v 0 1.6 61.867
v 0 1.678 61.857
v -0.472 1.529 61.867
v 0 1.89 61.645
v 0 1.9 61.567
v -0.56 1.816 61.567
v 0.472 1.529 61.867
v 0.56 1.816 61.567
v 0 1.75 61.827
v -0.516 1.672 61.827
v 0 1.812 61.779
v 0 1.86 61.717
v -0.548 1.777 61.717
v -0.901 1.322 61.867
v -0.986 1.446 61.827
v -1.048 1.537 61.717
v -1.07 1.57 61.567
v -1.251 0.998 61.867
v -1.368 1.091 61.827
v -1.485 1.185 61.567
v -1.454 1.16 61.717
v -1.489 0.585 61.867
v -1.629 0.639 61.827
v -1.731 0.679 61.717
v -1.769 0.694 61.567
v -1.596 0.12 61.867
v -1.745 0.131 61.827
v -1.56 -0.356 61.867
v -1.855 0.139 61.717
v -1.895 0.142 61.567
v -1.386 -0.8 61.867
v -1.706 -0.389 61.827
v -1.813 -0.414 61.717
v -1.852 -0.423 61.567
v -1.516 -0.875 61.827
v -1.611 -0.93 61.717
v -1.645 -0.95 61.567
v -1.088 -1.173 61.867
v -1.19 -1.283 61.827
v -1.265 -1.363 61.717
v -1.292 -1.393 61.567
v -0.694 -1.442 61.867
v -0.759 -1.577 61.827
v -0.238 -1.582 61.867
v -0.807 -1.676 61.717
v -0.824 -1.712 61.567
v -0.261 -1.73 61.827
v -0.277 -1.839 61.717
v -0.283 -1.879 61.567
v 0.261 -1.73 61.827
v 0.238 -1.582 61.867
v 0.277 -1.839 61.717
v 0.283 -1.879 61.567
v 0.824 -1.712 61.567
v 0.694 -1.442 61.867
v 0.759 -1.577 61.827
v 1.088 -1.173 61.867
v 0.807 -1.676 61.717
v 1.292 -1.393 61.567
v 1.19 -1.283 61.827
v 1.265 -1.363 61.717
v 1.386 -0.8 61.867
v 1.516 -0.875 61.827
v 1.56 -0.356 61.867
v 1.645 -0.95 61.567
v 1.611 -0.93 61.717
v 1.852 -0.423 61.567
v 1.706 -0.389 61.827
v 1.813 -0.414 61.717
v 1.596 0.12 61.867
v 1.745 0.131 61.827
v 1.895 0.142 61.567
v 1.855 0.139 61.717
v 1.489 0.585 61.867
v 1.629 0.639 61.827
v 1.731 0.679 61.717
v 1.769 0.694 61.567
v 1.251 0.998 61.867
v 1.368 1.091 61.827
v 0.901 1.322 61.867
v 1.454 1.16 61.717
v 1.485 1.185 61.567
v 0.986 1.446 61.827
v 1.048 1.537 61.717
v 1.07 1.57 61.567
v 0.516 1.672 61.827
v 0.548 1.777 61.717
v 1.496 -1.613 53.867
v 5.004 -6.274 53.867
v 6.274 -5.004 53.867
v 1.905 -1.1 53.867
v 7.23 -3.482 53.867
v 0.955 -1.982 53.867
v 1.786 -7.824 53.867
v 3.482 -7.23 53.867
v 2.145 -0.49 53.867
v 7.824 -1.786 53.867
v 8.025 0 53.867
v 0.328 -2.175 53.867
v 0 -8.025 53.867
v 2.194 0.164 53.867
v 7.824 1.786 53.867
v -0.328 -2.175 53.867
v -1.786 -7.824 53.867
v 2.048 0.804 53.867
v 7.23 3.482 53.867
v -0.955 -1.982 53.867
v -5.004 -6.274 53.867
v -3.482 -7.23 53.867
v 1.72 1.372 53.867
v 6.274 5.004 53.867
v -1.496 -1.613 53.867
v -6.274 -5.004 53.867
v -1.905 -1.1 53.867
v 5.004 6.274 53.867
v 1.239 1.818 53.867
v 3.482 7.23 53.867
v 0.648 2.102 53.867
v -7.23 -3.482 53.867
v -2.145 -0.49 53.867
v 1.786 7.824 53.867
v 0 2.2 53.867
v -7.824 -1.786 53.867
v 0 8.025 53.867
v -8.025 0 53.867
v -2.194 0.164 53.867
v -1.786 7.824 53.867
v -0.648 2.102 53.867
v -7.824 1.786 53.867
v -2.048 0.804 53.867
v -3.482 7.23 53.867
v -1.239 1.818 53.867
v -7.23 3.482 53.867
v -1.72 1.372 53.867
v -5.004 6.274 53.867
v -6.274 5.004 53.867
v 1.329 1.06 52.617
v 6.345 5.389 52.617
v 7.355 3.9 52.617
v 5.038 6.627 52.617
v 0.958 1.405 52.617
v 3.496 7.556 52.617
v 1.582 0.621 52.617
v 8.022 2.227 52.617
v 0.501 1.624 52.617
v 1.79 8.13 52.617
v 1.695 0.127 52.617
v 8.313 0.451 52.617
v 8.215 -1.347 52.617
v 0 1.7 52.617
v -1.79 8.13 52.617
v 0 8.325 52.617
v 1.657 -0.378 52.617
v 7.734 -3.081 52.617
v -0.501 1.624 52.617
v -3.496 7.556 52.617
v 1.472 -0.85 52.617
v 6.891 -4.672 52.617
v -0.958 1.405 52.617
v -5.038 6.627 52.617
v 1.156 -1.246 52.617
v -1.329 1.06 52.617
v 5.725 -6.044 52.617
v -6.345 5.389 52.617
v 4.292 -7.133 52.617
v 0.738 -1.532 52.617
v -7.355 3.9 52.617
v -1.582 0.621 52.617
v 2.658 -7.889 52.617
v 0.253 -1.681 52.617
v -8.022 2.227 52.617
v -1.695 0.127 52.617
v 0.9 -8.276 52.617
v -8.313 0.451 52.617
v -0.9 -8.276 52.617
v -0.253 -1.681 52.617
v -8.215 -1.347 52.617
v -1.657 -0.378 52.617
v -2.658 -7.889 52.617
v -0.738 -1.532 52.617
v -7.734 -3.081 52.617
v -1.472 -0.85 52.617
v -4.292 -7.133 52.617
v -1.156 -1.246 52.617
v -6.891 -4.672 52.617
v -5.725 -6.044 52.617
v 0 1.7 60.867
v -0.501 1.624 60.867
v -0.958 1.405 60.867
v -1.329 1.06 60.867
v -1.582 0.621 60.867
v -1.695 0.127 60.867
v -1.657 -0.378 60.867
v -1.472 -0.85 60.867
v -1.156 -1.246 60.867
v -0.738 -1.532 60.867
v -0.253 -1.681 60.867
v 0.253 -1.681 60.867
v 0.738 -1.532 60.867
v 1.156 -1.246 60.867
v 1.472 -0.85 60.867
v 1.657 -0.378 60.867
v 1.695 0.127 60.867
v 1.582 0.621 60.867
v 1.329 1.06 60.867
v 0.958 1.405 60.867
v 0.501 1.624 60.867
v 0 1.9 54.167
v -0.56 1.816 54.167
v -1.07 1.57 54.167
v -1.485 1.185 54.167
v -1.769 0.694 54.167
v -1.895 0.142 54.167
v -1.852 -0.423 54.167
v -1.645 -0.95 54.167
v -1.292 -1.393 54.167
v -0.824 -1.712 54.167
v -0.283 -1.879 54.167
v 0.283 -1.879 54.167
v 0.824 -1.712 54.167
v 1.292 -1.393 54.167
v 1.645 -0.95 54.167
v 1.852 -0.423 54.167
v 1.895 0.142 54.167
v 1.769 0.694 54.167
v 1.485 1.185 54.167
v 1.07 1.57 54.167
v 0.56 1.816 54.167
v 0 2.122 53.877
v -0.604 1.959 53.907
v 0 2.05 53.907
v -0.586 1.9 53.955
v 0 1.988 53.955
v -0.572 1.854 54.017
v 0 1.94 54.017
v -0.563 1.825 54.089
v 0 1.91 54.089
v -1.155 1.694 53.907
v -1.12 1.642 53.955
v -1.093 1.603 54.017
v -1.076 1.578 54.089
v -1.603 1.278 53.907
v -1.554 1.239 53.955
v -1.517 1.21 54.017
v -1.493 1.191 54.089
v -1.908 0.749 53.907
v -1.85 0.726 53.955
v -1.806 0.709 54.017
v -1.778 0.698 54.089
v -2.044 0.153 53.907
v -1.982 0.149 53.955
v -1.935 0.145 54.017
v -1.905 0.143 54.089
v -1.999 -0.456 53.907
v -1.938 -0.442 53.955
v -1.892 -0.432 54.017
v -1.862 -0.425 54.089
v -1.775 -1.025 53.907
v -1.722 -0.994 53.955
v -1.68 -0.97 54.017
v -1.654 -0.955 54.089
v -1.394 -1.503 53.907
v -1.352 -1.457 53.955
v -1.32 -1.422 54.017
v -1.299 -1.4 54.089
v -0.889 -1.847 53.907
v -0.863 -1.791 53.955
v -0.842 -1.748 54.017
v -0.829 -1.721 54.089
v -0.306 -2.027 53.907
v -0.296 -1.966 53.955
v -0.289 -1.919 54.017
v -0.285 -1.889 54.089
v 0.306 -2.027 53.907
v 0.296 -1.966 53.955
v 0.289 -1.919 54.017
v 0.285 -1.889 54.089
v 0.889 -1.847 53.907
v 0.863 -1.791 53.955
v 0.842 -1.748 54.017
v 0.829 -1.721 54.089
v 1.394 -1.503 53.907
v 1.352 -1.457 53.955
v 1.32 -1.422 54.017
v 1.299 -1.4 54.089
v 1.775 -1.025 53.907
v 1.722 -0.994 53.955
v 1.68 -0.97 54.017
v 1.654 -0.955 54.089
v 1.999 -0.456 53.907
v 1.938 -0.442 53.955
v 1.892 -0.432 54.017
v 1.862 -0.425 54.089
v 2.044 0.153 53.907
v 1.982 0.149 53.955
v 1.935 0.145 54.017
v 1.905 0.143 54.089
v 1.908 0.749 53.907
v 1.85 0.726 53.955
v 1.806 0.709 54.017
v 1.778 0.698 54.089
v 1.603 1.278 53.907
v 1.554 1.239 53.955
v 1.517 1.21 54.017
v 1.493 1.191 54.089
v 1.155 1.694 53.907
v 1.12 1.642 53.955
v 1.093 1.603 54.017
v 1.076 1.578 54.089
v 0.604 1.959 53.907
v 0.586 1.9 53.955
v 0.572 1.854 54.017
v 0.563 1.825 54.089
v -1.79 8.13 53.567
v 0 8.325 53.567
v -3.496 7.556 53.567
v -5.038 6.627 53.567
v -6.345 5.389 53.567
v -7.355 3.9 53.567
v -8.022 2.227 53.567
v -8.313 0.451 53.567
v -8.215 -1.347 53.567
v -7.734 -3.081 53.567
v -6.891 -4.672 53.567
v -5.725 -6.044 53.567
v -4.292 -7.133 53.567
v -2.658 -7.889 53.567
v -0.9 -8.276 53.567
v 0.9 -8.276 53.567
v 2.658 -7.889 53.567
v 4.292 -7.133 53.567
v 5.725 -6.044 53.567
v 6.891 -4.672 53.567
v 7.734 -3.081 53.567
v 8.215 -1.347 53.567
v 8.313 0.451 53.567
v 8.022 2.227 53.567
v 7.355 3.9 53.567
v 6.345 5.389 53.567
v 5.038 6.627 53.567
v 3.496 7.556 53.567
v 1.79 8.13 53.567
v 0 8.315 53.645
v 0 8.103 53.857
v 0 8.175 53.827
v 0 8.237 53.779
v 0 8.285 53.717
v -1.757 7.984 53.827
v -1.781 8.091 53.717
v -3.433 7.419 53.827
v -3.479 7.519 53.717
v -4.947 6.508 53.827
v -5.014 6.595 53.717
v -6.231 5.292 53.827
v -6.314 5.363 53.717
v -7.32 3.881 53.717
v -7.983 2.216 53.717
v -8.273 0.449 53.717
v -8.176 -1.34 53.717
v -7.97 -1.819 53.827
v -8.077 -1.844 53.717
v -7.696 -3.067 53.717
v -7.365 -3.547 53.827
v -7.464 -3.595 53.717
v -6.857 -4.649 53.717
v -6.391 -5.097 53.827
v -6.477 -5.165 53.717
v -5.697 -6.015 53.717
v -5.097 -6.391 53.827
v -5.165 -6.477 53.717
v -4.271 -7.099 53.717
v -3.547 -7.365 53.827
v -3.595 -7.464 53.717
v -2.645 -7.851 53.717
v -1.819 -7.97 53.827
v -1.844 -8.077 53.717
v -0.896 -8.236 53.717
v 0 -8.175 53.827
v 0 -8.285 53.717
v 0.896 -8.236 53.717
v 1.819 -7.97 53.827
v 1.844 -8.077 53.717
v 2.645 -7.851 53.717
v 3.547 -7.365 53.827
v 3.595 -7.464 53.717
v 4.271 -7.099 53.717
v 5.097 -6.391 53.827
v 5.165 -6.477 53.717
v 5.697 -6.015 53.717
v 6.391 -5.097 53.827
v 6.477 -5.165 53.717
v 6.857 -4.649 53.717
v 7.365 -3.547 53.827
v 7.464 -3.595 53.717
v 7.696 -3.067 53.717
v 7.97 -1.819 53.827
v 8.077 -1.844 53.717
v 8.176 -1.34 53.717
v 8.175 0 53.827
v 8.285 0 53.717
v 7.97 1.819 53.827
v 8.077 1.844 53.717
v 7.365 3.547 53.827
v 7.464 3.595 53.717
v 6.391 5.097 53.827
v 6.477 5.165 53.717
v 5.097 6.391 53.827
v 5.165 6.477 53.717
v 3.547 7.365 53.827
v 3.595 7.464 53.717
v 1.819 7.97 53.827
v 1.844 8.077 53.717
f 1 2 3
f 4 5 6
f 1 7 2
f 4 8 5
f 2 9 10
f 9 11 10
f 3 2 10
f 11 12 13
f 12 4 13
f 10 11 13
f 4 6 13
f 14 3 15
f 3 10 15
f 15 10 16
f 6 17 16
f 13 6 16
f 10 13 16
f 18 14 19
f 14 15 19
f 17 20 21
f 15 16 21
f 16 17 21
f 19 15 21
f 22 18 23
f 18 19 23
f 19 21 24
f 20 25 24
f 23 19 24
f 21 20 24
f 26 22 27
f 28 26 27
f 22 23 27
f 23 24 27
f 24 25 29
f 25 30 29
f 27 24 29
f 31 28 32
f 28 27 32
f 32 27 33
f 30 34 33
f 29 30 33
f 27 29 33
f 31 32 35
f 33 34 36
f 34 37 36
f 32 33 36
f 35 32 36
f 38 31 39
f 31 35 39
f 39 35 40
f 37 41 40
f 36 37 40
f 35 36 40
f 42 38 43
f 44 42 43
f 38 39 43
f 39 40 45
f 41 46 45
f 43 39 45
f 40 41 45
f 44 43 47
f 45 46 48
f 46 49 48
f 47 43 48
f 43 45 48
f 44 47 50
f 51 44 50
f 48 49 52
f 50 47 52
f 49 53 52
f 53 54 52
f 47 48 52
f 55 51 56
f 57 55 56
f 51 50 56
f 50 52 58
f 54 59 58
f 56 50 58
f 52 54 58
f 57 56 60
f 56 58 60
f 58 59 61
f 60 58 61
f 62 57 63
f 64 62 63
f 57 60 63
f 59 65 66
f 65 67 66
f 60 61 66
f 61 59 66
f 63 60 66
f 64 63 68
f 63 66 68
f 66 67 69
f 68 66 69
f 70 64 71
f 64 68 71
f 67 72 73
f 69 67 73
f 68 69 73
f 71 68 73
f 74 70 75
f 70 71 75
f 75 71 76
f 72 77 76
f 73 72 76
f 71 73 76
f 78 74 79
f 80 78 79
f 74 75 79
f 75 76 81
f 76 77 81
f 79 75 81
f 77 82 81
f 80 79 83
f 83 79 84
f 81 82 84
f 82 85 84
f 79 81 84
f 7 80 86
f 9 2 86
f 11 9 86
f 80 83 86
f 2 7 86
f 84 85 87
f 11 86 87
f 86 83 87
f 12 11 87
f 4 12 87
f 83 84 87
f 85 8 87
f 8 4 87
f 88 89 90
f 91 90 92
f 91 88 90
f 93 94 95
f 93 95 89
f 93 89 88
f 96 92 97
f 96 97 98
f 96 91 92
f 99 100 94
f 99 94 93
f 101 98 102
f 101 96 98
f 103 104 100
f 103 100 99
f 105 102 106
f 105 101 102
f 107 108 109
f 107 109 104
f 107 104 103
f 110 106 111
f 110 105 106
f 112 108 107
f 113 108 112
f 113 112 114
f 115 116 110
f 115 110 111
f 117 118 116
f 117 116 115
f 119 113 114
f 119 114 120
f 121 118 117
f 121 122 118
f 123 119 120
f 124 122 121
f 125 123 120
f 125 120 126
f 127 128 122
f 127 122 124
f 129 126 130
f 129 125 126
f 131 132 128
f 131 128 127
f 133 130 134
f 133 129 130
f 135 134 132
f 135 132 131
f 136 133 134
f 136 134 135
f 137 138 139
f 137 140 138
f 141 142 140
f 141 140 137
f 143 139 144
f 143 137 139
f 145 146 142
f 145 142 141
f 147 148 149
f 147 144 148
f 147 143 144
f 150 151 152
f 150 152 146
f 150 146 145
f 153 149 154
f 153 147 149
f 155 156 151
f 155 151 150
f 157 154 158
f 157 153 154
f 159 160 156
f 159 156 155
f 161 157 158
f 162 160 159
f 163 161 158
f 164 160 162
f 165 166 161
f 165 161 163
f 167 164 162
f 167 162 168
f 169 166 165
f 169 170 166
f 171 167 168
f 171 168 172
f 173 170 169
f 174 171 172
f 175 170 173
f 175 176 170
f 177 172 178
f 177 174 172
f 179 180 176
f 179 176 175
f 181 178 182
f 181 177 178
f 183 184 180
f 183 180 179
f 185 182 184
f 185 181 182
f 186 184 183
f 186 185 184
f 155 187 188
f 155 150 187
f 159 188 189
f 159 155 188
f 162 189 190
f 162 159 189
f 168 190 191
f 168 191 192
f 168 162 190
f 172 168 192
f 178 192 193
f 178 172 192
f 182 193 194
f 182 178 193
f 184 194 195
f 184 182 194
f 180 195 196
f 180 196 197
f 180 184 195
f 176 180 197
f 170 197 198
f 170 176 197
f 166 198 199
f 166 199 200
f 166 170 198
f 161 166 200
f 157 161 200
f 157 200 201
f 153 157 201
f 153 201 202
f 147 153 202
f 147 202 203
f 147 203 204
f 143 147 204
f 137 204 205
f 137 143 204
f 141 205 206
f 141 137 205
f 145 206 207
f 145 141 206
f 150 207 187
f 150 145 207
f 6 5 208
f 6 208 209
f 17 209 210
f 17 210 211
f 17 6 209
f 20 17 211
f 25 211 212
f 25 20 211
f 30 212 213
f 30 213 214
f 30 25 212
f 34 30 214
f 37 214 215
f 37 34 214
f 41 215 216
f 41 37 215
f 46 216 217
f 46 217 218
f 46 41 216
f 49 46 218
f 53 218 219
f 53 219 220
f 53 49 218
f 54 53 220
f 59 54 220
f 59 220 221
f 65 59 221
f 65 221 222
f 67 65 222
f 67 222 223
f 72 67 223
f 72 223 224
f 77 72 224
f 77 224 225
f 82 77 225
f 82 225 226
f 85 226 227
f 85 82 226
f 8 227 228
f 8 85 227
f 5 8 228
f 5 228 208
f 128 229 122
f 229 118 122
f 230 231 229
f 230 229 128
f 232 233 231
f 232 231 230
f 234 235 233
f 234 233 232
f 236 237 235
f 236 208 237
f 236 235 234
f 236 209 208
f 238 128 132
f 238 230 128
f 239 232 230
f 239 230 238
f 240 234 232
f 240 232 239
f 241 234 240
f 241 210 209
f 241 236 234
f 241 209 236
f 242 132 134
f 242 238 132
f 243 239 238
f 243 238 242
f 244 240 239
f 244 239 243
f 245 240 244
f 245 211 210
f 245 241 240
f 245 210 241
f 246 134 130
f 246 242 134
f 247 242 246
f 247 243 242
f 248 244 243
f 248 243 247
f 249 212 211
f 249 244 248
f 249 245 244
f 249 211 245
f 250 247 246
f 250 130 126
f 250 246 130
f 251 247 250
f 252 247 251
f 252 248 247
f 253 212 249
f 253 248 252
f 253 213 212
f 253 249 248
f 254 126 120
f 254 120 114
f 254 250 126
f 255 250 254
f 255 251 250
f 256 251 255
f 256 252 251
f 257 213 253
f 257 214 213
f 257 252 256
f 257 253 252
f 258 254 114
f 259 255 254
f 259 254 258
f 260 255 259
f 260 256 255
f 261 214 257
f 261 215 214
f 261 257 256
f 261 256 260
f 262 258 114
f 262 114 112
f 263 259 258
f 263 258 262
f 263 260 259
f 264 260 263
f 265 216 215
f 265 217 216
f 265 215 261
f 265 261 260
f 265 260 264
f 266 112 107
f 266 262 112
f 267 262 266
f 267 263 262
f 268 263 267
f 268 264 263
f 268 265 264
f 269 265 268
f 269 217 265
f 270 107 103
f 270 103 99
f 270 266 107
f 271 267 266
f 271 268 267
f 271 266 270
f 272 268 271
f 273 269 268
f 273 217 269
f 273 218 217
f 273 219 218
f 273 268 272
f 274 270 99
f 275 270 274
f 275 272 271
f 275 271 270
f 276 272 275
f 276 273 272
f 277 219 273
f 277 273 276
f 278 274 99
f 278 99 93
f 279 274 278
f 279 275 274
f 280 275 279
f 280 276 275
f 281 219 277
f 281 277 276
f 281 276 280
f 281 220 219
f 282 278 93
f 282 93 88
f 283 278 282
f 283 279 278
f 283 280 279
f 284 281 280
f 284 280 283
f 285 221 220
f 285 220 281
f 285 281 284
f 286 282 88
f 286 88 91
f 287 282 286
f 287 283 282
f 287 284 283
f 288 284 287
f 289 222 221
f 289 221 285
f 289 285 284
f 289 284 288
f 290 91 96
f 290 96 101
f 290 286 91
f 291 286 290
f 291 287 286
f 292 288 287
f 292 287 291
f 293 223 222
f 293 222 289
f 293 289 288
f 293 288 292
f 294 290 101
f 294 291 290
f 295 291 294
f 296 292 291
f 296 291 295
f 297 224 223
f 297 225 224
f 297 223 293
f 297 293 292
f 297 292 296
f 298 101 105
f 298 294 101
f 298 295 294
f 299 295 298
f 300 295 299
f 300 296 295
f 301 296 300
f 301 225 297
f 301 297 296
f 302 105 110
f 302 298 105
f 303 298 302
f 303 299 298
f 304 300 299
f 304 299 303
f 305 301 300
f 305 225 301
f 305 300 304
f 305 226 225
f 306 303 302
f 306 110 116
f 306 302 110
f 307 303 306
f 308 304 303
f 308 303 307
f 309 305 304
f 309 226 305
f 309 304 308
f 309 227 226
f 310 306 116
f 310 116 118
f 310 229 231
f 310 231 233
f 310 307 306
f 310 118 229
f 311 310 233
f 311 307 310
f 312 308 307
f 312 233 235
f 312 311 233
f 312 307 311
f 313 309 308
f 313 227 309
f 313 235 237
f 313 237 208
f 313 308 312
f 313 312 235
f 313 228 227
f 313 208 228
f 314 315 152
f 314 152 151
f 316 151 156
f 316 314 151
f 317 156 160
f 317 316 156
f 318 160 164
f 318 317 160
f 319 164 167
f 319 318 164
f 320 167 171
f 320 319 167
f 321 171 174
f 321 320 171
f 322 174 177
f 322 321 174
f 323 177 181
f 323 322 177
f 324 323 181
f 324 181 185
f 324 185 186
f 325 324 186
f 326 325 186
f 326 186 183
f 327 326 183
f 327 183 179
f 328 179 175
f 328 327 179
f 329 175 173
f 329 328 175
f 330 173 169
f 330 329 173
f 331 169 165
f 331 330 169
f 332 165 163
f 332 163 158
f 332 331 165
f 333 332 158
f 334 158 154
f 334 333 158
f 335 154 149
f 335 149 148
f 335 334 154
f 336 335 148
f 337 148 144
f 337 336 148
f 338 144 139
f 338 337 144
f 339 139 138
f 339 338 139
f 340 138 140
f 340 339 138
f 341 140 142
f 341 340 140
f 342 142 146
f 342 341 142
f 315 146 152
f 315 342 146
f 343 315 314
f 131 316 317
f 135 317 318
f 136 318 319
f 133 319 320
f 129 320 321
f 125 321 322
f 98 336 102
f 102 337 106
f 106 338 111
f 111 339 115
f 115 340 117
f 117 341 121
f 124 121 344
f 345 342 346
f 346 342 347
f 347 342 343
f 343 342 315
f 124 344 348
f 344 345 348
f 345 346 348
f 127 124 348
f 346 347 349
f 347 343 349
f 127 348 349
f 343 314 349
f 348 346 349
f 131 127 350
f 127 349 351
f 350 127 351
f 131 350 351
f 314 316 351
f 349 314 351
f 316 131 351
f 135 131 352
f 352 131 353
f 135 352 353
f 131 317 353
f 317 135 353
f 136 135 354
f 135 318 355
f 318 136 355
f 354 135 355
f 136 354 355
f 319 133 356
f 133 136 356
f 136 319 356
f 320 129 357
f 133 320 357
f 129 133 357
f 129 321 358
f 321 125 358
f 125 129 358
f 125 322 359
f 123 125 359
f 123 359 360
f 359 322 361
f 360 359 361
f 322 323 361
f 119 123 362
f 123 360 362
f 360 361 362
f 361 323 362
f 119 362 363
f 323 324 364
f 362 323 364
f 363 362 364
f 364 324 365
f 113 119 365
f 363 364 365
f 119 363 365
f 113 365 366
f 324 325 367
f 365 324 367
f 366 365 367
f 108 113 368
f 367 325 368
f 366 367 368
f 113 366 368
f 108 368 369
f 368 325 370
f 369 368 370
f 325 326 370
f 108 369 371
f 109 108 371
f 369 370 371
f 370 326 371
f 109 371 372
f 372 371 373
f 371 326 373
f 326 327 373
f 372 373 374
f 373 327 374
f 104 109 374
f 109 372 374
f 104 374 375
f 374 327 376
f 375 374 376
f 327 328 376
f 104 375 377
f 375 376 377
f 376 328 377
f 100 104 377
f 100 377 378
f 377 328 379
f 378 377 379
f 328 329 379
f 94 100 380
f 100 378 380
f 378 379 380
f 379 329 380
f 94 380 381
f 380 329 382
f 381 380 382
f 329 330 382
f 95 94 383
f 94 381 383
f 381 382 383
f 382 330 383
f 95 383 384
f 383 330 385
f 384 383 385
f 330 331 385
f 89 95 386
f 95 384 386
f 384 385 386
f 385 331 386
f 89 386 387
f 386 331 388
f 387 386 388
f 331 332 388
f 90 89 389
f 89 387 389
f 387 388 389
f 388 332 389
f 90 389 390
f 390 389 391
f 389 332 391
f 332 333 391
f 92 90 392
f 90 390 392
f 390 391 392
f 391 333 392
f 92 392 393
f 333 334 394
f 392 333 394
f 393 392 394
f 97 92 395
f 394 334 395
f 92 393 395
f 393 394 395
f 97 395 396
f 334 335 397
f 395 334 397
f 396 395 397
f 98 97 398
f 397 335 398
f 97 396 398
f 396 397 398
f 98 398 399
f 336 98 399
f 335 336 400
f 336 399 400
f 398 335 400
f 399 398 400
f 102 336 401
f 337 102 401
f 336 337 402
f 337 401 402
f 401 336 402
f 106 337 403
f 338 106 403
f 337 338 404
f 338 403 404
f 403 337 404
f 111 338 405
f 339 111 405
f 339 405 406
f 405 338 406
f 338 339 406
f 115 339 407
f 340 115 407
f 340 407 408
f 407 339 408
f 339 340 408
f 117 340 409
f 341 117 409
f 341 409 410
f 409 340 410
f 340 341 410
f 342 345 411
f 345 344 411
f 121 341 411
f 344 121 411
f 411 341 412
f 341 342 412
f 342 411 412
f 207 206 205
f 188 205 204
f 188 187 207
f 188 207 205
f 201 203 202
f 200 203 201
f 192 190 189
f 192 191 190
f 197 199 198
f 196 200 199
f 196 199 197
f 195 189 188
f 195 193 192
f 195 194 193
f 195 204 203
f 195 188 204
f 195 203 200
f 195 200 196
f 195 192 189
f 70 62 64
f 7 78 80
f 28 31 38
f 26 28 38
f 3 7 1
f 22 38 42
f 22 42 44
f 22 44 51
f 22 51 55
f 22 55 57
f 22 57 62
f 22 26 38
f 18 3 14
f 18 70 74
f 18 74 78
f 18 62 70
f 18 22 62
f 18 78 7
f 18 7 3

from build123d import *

# Parameters (mm, degrees)
F2_R = 0.3
F3_R = 0.3
F4_R = 0.3


with BuildPart() as f1:
    # F0 (on Right) → F1 (revolve)
    with BuildSketch(Plane.YZ):
        Polygon((1.9, 61.867032), (0, 61.867032), (0, 60.867032), (1.7, 60.867032), (1.7, 52.617032), (8.325, 52.617032), (8.325, 53.867032), (1.9, 53.867032), align=None)
    revolve(axis=Axis((0, 0, 61.367032), (0, 0, 1)))

    # F2
    f2_edges = [f1.edges().sort_by_distance(p)[0] for p in [
        (0, -1.9, 61.867032),
    ]]
    fillet(f2_edges, radius=F2_R)

    # F3
    f3_edges = [f1.edges().sort_by_distance(p)[0] for p in [
        (0, -8.325, 53.867032),
    ]]
    fillet(f3_edges, radius=F3_R)

    # F4
    f4_edges = [f1.edges().sort_by_distance(p)[0] for p in [
        (0, -1.9, 53.867032),
    ]]
    fillet(f4_edges, radius=F4_R)


solid = f1.part
